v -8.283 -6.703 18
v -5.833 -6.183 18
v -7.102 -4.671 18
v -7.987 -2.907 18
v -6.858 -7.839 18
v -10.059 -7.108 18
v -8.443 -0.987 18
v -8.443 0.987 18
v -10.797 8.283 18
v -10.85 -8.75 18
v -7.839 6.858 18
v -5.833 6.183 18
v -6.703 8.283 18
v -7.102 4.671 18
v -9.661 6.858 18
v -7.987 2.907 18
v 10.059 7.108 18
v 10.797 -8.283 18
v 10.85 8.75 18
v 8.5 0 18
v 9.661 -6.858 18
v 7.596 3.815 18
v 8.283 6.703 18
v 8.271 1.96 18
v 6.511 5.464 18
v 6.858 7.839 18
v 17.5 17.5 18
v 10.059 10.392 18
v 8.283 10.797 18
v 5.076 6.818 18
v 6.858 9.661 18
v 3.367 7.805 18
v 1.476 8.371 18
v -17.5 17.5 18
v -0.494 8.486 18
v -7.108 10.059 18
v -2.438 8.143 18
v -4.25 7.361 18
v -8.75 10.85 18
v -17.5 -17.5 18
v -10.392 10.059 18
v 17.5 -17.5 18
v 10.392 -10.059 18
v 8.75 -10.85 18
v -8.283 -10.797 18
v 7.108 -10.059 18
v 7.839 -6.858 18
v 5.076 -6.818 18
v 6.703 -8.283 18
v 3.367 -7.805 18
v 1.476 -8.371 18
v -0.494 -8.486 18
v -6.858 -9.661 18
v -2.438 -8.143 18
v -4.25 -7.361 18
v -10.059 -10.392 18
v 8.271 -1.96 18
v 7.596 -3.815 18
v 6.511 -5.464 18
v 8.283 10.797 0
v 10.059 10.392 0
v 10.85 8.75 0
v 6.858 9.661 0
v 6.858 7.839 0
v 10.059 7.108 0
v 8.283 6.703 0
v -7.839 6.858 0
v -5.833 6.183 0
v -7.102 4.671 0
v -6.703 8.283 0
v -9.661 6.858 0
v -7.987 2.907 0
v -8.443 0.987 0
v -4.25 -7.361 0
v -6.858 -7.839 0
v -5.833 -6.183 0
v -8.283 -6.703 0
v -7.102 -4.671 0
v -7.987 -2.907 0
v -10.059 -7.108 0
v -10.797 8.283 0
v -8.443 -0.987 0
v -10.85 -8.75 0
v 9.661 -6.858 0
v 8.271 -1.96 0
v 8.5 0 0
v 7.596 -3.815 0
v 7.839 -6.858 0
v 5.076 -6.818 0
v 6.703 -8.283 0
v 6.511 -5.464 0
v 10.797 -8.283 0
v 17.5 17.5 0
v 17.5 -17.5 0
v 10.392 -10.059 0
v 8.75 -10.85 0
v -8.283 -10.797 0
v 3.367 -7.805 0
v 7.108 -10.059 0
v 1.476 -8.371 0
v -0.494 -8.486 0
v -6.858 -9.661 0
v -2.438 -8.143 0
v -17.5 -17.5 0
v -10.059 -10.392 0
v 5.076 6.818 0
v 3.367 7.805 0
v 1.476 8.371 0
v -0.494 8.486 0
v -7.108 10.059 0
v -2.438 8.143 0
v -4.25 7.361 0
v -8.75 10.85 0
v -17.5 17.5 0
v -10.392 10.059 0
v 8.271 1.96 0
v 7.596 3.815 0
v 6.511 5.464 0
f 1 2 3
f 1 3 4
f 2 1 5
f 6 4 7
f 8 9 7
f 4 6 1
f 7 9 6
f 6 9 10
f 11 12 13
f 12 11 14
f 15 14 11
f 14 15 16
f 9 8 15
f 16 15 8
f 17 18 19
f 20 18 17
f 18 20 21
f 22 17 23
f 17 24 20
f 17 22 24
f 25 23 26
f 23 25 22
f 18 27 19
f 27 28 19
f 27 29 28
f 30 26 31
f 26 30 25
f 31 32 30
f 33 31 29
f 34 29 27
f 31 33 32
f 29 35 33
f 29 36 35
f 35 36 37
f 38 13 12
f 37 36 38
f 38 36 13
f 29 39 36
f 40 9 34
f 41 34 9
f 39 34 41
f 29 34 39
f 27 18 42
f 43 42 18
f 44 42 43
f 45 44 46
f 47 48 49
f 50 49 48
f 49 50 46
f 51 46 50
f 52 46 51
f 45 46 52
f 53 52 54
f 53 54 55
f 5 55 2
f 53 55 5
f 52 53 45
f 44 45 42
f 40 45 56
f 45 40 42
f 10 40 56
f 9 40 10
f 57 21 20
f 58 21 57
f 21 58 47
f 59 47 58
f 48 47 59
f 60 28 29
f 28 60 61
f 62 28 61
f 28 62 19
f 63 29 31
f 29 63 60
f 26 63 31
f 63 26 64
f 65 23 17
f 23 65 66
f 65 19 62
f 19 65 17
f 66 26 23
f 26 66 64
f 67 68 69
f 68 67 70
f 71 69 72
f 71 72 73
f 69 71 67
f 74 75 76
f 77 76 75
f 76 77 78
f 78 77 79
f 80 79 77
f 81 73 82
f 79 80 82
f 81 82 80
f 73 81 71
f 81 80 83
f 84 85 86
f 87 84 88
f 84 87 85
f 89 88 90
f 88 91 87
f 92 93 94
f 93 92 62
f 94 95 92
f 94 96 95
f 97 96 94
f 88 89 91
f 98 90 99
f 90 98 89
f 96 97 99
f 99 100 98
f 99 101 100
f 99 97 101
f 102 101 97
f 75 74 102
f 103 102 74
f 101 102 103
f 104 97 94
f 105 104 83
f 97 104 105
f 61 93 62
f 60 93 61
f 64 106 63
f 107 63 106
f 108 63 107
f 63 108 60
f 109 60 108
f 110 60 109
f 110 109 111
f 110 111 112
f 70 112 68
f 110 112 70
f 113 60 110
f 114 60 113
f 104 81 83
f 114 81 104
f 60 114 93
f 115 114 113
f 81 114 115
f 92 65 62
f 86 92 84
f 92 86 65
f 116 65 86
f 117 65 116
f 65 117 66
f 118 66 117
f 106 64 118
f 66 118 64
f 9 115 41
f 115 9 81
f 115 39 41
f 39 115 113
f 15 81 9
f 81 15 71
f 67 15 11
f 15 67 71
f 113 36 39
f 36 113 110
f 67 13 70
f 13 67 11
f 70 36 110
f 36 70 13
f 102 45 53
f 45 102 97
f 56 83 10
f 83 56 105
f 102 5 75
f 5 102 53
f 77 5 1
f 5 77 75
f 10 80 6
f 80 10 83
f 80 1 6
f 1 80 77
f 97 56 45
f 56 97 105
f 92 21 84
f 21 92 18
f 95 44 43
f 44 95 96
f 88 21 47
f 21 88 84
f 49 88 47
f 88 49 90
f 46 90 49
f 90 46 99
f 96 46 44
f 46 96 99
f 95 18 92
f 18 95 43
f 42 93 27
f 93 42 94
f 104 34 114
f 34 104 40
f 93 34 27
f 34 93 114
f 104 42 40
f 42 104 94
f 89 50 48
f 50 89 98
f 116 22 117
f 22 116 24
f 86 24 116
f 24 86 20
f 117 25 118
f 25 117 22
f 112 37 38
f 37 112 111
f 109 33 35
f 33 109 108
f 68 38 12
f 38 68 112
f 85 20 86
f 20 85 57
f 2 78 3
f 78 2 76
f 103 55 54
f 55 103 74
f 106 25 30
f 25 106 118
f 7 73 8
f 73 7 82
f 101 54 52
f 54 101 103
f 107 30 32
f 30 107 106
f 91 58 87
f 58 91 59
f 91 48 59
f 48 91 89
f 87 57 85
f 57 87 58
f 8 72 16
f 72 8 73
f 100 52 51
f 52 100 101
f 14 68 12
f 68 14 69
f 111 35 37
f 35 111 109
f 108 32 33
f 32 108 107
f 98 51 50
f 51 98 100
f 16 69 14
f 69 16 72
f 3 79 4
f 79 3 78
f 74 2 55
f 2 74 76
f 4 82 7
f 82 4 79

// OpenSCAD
module uhf_spacer(
  size=[35, 35, 18],
  bolt_spacing=17.5,
  bolt_d=4.2,
  center_d=17,
  cb_depth=0,
  cb_diameter=0,
) {

  difference() {
    translate([0,0, size[2]/2])
      cube(size, center=true);
  
    if (center_d > 0) {
      cylinder(r=center_d/2, h=size[2]);
    }

    for (i = [0 : 1 : 3]) {
      rotate([0, 0, i*90])
      translate([bolt_spacing/2, bolt_spacing/2, 0]) {
        cylinder(r=bolt_d/2, h=size[2]);
        if (cb_depth > 0) {
          translate([0, 0, size[2] - cb_depth])
            cylinder(r=cb_diameter/2, h=cb_depth+1);
        }
      }
    }
  }
}

uhf_spacer();
